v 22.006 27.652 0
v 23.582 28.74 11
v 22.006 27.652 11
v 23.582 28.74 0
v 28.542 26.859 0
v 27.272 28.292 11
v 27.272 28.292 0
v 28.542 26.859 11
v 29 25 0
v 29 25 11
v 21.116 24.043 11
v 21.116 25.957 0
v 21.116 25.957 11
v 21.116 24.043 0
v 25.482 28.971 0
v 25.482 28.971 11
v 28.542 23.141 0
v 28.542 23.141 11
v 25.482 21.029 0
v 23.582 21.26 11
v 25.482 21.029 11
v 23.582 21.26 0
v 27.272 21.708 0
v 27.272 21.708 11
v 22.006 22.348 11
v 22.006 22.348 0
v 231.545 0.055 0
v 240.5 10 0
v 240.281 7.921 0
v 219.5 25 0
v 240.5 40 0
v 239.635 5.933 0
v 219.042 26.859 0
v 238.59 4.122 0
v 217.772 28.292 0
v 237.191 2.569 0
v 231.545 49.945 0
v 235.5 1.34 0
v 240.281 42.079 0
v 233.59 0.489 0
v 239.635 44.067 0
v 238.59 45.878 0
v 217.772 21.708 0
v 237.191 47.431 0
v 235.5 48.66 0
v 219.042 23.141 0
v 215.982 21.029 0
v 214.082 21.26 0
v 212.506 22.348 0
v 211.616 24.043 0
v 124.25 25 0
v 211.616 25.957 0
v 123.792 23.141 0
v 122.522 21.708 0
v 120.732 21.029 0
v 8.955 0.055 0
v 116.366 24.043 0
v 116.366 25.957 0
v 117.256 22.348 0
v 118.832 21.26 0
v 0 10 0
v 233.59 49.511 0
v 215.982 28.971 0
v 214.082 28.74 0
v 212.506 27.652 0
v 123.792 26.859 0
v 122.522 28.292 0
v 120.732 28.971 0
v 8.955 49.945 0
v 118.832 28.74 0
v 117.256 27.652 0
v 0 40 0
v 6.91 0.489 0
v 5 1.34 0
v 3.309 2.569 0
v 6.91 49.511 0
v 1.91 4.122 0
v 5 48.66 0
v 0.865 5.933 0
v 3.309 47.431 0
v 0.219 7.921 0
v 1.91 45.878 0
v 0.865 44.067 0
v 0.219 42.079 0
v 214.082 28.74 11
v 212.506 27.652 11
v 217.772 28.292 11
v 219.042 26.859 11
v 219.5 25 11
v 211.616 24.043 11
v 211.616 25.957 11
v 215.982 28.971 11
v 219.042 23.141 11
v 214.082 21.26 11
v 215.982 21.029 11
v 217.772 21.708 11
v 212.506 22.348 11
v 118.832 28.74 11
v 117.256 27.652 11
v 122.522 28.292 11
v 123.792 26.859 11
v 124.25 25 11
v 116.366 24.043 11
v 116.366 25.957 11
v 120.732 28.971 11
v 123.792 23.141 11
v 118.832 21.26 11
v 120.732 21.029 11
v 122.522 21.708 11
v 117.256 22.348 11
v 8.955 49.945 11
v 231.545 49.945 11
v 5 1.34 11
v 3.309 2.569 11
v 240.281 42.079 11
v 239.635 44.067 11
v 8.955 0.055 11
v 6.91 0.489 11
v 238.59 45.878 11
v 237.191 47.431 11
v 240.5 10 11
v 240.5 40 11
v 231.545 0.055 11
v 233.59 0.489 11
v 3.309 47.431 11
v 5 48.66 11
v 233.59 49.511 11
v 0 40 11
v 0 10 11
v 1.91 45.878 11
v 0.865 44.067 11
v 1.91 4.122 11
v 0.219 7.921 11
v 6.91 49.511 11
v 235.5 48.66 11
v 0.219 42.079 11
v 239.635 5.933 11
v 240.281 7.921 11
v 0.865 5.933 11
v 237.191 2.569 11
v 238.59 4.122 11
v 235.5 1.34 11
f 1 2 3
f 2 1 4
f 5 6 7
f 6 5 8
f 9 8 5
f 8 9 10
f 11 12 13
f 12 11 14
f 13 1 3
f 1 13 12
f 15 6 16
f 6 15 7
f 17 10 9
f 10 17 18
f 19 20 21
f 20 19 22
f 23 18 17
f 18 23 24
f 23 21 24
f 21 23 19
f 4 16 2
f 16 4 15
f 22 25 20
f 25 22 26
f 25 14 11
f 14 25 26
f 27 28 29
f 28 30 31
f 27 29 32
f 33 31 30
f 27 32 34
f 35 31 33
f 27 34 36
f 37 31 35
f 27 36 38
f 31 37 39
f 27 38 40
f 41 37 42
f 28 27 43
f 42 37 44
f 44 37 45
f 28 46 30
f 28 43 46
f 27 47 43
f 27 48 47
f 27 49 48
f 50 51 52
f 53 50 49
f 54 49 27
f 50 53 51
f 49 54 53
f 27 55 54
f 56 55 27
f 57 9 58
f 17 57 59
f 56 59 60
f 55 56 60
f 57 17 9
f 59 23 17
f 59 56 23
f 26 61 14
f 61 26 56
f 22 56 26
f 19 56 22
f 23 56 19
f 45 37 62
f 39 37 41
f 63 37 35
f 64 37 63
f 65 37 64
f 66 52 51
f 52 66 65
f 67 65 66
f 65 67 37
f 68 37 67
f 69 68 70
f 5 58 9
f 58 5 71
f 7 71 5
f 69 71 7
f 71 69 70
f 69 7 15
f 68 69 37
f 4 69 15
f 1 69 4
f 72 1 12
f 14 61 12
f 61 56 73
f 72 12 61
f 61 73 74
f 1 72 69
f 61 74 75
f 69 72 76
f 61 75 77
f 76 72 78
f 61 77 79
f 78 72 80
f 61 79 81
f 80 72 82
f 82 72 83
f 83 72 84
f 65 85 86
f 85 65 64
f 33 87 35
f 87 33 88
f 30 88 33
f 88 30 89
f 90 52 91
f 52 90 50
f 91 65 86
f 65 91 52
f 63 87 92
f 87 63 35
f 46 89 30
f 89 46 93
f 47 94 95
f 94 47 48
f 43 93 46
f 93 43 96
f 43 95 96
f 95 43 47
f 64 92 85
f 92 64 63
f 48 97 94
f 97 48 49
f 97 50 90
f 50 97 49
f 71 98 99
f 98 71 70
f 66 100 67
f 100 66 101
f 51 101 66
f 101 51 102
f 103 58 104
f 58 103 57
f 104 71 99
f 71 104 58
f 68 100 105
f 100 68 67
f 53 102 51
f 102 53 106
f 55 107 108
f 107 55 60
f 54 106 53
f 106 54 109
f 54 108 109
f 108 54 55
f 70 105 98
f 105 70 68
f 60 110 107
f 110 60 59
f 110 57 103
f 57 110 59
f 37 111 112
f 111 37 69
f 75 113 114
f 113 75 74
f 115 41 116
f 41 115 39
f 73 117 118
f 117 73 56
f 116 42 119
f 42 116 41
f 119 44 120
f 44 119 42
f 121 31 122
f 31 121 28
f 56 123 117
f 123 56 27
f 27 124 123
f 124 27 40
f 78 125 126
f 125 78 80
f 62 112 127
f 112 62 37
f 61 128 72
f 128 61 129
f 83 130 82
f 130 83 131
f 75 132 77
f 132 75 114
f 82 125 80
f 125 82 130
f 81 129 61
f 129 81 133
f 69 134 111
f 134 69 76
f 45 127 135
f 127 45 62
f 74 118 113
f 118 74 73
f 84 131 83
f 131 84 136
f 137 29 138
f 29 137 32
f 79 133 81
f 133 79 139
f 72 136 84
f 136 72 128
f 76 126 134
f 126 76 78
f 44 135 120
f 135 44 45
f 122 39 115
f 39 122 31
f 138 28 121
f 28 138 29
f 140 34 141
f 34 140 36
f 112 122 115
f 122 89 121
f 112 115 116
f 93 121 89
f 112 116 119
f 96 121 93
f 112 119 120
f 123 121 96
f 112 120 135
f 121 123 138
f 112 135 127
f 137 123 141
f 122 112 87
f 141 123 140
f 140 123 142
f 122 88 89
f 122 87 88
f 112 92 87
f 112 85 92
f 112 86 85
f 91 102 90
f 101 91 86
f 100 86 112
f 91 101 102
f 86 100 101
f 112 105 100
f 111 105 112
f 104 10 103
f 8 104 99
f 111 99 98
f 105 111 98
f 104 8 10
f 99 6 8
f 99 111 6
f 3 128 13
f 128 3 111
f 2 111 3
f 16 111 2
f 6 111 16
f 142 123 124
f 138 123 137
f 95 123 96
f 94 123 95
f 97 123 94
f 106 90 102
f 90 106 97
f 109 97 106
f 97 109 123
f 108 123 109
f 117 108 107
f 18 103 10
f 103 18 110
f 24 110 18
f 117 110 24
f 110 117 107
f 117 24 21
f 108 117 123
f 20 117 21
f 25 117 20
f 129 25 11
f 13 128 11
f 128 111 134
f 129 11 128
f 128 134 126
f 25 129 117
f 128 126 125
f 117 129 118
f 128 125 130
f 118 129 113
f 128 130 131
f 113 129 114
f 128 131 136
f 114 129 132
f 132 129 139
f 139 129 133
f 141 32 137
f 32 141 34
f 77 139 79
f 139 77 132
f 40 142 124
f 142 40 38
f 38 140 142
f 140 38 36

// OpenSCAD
LP = 25; // pads
L = 190.5 + 2*LP;
W = 50;
H = 10;
R = 4;


difference() {
    // bar
    rr =10;
    translate([rr,rr,0])
    minkowski() {
        cylinder(r=rr, h=1);
        cube([L-2*rr,W-2*rr,H]);
    }

    // holes 
    union() {
        
        // holes for screws
        translate([LP, W/2, 0]) {
            cylinder(r=R, h= H+10);
        }

        translate([L-LP, W/2, 0]) {
            cylinder(r=R, h= H+10);
        }

        translate([L/2, W/2, 0]) {
            cylinder(r=R, h= H+10);
        }
        
        // holdes for speed cut
        
        
    }
    
    
}
